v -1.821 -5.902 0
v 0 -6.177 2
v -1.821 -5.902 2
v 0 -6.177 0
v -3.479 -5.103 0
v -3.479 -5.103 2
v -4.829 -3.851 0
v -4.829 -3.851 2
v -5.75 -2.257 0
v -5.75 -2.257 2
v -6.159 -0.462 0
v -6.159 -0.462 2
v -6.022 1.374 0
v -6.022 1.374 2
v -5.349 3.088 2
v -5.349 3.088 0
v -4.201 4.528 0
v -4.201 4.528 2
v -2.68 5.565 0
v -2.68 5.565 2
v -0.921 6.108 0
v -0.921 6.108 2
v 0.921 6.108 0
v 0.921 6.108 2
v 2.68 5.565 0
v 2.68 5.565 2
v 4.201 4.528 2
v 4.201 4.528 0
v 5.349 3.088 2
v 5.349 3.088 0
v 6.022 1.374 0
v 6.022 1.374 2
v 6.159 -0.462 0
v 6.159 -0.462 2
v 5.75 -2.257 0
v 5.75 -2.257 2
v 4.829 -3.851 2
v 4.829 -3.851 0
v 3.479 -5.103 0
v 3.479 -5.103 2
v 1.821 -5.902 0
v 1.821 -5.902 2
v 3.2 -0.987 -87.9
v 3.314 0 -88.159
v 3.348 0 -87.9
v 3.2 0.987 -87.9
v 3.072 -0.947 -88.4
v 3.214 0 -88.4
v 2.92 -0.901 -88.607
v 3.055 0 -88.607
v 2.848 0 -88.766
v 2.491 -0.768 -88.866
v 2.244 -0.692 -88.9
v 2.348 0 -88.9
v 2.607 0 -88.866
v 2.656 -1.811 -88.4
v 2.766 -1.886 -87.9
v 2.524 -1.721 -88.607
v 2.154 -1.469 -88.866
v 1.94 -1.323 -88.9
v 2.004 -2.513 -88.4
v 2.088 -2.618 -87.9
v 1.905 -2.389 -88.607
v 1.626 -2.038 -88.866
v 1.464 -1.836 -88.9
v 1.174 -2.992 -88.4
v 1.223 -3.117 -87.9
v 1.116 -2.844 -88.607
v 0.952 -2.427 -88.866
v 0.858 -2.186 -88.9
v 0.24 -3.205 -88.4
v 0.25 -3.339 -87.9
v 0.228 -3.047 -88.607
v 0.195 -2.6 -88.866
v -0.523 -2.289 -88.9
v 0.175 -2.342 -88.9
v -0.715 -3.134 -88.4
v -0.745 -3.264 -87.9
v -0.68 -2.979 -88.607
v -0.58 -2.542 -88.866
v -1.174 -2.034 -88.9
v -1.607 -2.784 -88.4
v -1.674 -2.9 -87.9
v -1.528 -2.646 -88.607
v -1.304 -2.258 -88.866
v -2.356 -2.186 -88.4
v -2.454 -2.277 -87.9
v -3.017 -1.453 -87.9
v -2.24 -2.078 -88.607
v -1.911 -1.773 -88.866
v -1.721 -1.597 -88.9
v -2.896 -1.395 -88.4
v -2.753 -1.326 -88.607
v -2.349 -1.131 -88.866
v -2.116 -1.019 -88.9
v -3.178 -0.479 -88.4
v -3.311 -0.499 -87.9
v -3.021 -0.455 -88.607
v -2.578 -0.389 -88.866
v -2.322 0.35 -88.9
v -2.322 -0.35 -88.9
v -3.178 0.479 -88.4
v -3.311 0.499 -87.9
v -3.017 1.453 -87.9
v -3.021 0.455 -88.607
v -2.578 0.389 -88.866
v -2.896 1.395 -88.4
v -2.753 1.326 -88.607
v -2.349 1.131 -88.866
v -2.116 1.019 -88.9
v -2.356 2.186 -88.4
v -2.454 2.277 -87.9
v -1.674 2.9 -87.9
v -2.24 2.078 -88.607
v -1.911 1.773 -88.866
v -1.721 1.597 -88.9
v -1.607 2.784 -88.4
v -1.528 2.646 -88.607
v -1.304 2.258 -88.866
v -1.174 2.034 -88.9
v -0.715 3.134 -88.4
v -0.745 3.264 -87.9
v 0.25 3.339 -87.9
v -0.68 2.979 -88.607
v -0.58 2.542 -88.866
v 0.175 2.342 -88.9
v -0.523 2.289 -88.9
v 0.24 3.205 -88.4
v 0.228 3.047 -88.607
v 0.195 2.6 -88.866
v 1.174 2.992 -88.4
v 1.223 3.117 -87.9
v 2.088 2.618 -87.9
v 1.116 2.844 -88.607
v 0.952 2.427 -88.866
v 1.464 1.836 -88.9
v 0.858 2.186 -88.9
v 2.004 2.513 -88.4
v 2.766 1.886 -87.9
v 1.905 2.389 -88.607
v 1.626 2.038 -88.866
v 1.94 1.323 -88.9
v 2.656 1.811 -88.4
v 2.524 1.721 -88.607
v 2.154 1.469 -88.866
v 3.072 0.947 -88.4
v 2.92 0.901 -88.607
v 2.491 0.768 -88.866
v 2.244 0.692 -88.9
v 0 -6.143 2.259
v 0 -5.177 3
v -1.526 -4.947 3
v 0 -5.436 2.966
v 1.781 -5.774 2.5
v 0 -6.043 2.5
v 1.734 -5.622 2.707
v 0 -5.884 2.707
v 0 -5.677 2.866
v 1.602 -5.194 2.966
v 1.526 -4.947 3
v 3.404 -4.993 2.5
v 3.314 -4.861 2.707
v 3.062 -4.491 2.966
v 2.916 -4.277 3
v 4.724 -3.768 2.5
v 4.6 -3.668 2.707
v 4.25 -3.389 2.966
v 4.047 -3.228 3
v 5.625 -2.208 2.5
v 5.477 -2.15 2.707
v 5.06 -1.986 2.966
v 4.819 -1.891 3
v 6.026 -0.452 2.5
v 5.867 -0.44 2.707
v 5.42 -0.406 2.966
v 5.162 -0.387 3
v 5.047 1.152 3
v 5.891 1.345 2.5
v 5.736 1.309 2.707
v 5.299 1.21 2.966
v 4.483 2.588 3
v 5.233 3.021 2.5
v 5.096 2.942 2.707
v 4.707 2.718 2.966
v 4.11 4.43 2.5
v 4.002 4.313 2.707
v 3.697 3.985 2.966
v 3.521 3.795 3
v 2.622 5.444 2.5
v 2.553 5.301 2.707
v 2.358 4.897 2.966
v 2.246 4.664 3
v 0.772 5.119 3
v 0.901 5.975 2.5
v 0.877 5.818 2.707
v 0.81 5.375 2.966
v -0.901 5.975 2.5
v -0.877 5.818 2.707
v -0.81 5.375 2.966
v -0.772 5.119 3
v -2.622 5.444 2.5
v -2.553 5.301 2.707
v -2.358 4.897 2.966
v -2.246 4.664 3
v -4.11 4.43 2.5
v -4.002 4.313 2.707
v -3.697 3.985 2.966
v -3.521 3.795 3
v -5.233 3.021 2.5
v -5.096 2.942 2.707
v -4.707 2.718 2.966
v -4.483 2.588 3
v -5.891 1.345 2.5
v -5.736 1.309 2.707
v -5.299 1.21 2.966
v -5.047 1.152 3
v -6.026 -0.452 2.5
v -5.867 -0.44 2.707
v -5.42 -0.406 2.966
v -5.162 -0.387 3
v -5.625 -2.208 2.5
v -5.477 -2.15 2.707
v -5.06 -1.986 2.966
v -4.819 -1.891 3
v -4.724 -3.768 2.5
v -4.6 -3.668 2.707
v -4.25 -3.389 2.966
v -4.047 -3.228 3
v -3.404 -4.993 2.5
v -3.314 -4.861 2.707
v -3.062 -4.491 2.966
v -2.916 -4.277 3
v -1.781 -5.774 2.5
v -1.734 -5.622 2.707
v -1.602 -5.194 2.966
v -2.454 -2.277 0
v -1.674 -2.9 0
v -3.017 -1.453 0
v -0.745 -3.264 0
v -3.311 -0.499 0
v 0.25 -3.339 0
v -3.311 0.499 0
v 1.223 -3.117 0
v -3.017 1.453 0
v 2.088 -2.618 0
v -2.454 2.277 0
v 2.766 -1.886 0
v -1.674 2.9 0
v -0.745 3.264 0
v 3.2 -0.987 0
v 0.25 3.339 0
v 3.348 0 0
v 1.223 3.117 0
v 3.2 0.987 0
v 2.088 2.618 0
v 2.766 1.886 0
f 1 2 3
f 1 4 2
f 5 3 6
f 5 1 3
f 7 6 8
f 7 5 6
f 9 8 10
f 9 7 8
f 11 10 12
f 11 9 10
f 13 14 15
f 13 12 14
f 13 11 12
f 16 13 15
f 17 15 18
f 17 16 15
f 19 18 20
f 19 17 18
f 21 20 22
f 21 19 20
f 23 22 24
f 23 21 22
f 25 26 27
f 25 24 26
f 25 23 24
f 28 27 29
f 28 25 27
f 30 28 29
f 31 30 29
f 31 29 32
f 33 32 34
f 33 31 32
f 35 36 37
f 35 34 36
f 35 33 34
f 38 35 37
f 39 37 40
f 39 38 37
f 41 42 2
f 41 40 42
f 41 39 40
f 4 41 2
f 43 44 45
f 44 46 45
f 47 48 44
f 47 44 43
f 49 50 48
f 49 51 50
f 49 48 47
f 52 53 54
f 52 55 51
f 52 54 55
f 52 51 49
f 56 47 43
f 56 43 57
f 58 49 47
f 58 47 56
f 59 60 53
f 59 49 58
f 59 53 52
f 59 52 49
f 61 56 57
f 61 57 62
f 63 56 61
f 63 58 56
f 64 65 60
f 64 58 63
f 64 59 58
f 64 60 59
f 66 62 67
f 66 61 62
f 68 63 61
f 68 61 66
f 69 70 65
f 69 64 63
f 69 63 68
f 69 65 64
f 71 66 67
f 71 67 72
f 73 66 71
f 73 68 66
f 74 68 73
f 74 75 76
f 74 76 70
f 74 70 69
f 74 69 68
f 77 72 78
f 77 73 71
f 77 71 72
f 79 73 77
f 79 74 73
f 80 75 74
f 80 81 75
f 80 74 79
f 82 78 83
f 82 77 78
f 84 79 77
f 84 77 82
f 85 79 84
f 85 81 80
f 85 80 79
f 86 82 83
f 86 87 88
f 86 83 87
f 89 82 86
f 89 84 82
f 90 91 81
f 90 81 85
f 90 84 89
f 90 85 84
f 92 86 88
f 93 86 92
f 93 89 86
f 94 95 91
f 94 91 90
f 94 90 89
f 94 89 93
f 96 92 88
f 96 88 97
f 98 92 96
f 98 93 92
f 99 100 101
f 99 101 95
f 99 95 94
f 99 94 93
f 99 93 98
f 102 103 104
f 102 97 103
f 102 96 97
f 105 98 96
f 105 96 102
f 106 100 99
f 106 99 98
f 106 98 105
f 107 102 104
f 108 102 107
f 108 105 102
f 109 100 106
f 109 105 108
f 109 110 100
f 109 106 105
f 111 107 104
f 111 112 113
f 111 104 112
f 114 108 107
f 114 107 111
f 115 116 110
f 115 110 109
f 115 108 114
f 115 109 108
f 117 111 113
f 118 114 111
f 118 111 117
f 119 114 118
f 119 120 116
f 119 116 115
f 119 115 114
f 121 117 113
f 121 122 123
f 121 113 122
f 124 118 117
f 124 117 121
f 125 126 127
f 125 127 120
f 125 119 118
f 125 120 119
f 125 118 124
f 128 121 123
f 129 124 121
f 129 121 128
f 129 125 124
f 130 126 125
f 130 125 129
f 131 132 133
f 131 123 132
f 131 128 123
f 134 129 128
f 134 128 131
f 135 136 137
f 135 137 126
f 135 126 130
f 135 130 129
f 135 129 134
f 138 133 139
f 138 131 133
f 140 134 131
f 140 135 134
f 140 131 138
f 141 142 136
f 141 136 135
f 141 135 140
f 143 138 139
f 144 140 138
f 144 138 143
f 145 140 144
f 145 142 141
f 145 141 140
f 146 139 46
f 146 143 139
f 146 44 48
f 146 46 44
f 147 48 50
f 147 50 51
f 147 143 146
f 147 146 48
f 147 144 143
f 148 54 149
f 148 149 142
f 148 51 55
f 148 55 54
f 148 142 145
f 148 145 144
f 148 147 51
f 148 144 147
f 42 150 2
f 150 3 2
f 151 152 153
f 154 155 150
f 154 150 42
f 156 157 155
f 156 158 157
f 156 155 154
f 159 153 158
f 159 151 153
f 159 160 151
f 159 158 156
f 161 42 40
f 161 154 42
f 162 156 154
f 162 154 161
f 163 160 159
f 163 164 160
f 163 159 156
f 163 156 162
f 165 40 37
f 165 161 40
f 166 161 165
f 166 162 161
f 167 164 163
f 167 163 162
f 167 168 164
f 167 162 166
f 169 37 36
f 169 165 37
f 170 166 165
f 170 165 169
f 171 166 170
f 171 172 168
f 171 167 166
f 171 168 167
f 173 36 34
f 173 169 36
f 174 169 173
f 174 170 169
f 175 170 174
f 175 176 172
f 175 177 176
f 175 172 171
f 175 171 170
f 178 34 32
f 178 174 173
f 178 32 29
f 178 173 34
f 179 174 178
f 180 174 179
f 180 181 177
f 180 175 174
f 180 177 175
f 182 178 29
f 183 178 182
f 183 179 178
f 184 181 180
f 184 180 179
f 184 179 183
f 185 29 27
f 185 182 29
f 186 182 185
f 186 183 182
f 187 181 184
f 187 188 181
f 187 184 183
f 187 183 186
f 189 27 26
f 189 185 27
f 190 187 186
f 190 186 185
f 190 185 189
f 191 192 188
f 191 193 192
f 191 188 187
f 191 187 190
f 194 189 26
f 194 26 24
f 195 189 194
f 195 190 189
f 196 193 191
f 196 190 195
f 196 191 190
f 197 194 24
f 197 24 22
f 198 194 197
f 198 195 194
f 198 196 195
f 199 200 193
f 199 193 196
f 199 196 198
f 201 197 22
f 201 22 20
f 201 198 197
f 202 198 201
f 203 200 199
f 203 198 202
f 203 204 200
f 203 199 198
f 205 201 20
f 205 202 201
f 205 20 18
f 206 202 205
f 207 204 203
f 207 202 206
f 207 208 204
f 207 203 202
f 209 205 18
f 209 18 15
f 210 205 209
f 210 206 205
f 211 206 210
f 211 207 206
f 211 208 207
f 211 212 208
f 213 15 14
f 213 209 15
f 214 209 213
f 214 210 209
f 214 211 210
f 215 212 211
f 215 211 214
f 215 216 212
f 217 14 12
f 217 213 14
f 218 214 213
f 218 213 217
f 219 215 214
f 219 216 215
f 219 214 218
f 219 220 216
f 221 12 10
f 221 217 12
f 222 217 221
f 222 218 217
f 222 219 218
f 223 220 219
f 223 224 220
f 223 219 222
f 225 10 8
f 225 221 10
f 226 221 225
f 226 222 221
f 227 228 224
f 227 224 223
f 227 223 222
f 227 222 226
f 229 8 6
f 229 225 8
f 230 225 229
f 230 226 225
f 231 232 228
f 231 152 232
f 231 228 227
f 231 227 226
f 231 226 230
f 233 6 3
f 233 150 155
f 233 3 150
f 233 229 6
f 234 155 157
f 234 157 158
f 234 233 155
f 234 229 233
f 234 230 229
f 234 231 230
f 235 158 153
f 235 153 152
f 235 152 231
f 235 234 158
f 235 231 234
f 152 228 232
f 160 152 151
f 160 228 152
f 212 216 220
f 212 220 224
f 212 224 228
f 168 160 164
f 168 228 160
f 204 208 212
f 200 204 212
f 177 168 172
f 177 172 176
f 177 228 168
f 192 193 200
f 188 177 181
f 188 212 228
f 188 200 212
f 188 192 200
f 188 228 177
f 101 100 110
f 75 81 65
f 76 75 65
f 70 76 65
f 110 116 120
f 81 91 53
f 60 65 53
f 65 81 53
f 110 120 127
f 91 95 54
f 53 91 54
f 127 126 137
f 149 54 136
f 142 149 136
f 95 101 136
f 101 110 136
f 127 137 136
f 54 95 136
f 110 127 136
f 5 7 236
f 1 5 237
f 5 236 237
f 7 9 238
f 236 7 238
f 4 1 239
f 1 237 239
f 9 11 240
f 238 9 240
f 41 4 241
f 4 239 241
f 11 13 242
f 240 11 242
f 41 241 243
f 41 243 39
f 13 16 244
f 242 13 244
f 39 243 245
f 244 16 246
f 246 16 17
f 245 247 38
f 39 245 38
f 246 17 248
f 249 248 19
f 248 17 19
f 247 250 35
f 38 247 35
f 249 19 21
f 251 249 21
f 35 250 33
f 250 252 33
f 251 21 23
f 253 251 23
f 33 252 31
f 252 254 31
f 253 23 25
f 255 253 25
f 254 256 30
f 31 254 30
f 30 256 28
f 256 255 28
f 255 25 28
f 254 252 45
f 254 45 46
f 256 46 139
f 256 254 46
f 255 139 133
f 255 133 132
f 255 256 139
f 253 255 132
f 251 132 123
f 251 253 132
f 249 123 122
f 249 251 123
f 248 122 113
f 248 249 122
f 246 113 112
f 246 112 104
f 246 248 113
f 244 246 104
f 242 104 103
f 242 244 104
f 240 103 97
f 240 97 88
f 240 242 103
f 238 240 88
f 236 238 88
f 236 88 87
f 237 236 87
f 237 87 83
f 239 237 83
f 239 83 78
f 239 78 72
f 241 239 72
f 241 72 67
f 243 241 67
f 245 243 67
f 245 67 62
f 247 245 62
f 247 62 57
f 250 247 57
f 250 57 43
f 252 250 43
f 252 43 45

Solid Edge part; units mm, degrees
sketch "Sketch1" plane through (0, 0, 0) normal (0, 0, 1) x (1, 0, 0)
  circle A0 centre (0, 0) radius 3.3483
  dimension "D1" = 6.6965
extrude "Protrusion1" add sketch "Sketch1" against normal up to vertex (88.9 mm away)
fillet "Round1" radius 1 1 edges at (-3.3483, 0, -88.9)
sketch "Sketch2" plane through (0, 0, 0) normal (0, 0, 1) x (0, -1, 0)
  circle A0 centre (0, 0) radius 6.1767
extrude "ExtrudedProtrusion_2" add sketch "Sketch2" along normal blind 3
fillet "Round_2" radius 1 1 edges at (0, 6.1767, 3)
